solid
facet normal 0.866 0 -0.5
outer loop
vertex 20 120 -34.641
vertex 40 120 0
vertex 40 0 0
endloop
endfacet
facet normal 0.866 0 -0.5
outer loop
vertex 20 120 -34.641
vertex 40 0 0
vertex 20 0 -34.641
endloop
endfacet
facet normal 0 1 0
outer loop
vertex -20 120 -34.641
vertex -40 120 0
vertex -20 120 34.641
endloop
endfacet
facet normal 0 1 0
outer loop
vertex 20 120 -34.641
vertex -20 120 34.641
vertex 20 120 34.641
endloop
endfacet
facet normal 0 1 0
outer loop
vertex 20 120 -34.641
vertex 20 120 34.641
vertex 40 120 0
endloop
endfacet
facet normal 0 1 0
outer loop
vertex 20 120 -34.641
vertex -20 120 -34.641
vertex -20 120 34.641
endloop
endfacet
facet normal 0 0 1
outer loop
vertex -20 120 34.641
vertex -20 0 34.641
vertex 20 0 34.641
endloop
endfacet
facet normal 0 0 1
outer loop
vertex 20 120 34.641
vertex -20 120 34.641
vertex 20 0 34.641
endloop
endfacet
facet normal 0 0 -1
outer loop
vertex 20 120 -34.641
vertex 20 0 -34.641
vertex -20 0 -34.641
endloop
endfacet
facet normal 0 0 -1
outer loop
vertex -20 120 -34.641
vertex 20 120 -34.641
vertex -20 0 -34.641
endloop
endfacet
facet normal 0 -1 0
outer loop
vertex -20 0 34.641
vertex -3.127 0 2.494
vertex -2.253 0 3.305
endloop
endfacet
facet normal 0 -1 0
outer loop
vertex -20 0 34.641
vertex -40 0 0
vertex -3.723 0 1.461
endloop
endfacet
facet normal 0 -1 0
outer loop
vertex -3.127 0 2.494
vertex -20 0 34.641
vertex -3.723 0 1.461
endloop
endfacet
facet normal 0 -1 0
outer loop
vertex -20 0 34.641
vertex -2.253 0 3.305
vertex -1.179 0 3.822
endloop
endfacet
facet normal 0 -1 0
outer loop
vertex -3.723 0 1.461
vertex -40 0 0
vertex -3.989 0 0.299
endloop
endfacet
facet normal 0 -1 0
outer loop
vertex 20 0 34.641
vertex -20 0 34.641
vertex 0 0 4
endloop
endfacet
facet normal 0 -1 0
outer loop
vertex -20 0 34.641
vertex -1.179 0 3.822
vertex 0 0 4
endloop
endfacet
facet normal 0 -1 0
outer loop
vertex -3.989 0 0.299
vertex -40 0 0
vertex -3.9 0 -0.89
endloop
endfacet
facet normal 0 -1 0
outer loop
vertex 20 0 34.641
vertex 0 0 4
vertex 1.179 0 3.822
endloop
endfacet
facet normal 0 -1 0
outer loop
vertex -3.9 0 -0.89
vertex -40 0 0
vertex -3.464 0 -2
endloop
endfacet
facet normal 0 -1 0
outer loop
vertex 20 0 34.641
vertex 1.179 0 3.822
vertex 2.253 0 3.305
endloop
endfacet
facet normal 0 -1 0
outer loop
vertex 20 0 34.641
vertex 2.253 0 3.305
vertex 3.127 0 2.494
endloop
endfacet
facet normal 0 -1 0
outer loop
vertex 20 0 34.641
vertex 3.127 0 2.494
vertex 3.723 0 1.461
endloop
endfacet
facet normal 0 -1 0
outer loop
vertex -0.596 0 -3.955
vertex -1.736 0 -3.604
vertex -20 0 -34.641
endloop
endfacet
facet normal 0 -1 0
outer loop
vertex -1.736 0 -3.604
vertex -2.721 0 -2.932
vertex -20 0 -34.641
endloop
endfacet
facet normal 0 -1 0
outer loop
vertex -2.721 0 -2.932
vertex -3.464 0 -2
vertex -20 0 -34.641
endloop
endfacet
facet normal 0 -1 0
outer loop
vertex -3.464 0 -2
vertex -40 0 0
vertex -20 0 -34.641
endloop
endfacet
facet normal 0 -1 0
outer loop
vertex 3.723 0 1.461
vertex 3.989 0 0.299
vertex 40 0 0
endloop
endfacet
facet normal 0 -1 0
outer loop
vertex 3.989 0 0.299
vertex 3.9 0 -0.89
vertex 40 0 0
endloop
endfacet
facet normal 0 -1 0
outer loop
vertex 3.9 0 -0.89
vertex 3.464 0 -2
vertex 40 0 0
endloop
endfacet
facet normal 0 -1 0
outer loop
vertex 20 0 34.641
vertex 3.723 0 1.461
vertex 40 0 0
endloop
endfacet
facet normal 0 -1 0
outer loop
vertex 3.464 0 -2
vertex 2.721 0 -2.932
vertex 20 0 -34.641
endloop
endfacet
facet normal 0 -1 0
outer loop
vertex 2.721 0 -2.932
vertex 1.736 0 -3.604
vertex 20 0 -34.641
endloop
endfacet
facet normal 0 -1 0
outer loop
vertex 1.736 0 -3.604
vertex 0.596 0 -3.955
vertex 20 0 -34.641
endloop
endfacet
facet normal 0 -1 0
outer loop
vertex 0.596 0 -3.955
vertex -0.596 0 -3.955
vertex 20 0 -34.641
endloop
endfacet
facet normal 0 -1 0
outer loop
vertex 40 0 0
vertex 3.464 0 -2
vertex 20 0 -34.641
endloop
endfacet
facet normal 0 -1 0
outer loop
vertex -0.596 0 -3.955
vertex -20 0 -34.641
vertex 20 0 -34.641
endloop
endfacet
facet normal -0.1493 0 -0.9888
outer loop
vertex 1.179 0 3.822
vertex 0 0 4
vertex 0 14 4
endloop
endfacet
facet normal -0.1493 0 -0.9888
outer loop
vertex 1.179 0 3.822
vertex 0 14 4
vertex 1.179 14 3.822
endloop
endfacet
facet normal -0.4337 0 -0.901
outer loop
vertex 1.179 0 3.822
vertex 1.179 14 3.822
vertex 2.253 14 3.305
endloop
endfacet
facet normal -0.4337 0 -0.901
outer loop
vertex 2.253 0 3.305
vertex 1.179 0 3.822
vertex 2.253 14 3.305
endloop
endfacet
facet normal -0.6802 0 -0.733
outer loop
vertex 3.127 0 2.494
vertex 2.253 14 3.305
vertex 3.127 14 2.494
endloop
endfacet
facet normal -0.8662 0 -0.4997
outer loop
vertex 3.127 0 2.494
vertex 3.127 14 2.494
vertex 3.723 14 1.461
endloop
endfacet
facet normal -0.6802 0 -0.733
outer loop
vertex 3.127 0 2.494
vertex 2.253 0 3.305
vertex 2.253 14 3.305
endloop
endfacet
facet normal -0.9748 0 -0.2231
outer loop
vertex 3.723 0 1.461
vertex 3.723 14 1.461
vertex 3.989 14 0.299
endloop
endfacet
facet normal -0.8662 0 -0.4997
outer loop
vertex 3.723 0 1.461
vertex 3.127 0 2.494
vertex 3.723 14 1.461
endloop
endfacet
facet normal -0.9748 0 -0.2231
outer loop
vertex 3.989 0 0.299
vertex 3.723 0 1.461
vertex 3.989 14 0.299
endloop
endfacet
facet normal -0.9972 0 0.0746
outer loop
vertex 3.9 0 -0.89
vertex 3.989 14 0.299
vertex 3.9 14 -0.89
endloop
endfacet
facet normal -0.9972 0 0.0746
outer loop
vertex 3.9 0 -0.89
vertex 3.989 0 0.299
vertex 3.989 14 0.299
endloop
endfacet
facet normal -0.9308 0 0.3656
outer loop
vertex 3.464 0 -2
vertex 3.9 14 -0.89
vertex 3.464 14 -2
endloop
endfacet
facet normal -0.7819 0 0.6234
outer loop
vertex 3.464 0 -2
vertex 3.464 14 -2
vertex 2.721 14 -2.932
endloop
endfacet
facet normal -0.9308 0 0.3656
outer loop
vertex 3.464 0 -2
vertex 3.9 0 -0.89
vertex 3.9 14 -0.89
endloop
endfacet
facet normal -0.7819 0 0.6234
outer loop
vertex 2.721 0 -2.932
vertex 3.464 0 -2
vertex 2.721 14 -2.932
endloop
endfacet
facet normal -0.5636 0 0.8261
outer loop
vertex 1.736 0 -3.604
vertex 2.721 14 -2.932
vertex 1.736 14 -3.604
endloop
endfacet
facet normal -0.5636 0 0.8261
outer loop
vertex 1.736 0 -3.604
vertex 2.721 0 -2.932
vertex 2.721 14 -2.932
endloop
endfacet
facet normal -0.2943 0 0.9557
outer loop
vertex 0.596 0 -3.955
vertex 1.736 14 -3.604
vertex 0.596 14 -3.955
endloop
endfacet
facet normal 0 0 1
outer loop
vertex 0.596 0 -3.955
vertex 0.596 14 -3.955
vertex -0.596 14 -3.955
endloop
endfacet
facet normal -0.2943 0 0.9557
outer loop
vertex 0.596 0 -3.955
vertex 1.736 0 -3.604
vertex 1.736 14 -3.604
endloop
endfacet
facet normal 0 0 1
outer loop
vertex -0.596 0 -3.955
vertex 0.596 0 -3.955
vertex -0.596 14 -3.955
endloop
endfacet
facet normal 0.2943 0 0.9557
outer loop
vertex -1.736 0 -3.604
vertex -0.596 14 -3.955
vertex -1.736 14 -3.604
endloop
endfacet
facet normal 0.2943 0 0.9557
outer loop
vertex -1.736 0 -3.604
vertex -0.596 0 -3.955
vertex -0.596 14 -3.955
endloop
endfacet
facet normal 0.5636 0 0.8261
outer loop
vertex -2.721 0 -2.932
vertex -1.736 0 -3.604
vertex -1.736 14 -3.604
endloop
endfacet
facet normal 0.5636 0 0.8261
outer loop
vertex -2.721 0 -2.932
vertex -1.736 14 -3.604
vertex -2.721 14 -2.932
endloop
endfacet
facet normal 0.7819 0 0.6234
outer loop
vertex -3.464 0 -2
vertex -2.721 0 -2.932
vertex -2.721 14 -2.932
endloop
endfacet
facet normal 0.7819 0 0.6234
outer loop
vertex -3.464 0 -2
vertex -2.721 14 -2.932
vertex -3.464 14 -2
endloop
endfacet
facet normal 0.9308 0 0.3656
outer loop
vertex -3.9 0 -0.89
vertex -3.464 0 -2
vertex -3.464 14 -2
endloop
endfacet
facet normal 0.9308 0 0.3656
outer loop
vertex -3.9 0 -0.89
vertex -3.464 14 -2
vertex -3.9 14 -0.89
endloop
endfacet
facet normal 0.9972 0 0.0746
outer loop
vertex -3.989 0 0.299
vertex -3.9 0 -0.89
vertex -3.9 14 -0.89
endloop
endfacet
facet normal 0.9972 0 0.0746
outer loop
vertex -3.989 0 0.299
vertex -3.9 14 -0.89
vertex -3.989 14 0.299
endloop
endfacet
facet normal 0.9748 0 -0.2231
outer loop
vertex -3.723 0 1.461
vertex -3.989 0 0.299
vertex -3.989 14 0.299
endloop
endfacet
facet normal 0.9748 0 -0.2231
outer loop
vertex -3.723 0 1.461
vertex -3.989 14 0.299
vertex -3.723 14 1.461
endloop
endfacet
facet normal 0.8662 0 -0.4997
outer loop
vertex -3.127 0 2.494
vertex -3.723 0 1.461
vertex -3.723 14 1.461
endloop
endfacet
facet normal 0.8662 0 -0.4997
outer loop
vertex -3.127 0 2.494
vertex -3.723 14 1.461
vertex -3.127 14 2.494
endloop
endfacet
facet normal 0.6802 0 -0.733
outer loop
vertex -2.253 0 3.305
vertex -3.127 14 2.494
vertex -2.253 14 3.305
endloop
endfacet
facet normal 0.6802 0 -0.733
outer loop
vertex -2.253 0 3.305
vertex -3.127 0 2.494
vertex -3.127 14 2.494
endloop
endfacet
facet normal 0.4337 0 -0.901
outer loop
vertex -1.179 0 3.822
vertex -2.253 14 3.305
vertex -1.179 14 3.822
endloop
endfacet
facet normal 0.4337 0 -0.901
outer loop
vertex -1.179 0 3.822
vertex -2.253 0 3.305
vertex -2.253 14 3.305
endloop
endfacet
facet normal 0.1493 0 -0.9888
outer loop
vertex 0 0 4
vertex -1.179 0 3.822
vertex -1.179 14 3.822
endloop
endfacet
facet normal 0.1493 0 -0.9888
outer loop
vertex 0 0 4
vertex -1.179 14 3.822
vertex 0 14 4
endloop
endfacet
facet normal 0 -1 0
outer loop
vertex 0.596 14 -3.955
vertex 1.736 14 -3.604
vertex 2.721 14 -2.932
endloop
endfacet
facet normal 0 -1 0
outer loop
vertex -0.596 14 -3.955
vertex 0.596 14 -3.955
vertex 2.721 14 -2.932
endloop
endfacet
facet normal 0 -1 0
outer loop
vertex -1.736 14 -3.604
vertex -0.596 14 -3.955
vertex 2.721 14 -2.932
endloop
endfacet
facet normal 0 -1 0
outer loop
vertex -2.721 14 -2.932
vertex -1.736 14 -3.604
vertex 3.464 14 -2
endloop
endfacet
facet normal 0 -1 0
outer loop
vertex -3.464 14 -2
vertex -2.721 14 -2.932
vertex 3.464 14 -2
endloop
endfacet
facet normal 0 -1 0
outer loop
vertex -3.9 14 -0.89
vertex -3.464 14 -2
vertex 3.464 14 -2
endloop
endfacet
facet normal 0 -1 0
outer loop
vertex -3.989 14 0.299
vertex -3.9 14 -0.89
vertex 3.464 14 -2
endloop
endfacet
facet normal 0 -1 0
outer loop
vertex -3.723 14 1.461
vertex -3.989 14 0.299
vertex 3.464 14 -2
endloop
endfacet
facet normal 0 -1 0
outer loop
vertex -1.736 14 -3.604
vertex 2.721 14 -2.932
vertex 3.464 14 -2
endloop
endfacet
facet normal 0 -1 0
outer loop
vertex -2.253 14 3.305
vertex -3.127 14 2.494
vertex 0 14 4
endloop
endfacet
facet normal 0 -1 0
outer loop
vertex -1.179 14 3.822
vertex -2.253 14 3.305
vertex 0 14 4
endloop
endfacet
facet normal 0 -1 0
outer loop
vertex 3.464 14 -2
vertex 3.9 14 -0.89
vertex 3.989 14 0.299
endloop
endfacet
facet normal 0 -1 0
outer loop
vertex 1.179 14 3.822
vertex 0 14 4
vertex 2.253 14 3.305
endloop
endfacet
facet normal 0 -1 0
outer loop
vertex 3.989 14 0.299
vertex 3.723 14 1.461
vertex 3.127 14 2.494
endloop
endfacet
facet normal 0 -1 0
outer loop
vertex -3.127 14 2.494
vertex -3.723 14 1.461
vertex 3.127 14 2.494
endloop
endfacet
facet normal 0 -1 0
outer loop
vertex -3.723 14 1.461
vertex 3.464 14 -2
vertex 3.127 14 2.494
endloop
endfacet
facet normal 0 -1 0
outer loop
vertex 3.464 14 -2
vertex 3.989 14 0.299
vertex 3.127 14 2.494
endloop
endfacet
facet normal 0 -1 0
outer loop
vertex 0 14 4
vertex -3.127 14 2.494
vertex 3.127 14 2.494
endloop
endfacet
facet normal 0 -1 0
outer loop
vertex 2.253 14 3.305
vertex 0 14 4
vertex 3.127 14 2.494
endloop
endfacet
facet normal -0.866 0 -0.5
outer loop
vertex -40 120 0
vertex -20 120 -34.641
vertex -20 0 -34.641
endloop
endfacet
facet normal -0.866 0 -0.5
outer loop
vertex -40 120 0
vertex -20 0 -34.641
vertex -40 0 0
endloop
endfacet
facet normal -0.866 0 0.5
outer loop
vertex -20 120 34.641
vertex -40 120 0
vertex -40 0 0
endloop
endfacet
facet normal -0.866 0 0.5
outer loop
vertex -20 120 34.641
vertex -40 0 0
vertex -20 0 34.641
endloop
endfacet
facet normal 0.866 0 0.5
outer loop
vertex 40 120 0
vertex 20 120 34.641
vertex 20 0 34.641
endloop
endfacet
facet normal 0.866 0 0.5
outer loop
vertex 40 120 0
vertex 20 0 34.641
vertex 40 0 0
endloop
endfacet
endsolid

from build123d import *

# Parameters (mm, degrees)
PRISMA_HEXAGONAL_DEPTH     = 120
CROQUIS_AGUJEROS_MONTAJE_R = 4
AGUJERO_INSERTO_M6_DEPTH   = 14


with BuildPart() as part:
    # Croquis_hexagono → Prisma_hexagonal (new body)
    with BuildSketch(Plane(origin=(0, 0, 0), x_dir=(1, 0, 0), z_dir=(0, 1, 0))):
        Polygon((40, 0), (20, 34.641016151), (-20, 34.641016151), (-40, 0), (-20, -34.641016151), (20, -34.641016151), align=None)
    extrude(amount=PRISMA_HEXAGONAL_DEPTH)

    # Croquis_agujeros_montaje → Agujero_inserto_M6 (cut)
    with BuildSketch(Plane(origin=(0, 0, 0), x_dir=(1, 0, 0), z_dir=(0, 1, 0))):
        with Locations(Location((0, 0, 0), (0, 0, 270))):
            Circle(CROQUIS_AGUJEROS_MONTAJE_R)
    extrude(amount=AGUJERO_INSERTO_M6_DEPTH, mode=Mode.SUBTRACT)


solid = part.part
